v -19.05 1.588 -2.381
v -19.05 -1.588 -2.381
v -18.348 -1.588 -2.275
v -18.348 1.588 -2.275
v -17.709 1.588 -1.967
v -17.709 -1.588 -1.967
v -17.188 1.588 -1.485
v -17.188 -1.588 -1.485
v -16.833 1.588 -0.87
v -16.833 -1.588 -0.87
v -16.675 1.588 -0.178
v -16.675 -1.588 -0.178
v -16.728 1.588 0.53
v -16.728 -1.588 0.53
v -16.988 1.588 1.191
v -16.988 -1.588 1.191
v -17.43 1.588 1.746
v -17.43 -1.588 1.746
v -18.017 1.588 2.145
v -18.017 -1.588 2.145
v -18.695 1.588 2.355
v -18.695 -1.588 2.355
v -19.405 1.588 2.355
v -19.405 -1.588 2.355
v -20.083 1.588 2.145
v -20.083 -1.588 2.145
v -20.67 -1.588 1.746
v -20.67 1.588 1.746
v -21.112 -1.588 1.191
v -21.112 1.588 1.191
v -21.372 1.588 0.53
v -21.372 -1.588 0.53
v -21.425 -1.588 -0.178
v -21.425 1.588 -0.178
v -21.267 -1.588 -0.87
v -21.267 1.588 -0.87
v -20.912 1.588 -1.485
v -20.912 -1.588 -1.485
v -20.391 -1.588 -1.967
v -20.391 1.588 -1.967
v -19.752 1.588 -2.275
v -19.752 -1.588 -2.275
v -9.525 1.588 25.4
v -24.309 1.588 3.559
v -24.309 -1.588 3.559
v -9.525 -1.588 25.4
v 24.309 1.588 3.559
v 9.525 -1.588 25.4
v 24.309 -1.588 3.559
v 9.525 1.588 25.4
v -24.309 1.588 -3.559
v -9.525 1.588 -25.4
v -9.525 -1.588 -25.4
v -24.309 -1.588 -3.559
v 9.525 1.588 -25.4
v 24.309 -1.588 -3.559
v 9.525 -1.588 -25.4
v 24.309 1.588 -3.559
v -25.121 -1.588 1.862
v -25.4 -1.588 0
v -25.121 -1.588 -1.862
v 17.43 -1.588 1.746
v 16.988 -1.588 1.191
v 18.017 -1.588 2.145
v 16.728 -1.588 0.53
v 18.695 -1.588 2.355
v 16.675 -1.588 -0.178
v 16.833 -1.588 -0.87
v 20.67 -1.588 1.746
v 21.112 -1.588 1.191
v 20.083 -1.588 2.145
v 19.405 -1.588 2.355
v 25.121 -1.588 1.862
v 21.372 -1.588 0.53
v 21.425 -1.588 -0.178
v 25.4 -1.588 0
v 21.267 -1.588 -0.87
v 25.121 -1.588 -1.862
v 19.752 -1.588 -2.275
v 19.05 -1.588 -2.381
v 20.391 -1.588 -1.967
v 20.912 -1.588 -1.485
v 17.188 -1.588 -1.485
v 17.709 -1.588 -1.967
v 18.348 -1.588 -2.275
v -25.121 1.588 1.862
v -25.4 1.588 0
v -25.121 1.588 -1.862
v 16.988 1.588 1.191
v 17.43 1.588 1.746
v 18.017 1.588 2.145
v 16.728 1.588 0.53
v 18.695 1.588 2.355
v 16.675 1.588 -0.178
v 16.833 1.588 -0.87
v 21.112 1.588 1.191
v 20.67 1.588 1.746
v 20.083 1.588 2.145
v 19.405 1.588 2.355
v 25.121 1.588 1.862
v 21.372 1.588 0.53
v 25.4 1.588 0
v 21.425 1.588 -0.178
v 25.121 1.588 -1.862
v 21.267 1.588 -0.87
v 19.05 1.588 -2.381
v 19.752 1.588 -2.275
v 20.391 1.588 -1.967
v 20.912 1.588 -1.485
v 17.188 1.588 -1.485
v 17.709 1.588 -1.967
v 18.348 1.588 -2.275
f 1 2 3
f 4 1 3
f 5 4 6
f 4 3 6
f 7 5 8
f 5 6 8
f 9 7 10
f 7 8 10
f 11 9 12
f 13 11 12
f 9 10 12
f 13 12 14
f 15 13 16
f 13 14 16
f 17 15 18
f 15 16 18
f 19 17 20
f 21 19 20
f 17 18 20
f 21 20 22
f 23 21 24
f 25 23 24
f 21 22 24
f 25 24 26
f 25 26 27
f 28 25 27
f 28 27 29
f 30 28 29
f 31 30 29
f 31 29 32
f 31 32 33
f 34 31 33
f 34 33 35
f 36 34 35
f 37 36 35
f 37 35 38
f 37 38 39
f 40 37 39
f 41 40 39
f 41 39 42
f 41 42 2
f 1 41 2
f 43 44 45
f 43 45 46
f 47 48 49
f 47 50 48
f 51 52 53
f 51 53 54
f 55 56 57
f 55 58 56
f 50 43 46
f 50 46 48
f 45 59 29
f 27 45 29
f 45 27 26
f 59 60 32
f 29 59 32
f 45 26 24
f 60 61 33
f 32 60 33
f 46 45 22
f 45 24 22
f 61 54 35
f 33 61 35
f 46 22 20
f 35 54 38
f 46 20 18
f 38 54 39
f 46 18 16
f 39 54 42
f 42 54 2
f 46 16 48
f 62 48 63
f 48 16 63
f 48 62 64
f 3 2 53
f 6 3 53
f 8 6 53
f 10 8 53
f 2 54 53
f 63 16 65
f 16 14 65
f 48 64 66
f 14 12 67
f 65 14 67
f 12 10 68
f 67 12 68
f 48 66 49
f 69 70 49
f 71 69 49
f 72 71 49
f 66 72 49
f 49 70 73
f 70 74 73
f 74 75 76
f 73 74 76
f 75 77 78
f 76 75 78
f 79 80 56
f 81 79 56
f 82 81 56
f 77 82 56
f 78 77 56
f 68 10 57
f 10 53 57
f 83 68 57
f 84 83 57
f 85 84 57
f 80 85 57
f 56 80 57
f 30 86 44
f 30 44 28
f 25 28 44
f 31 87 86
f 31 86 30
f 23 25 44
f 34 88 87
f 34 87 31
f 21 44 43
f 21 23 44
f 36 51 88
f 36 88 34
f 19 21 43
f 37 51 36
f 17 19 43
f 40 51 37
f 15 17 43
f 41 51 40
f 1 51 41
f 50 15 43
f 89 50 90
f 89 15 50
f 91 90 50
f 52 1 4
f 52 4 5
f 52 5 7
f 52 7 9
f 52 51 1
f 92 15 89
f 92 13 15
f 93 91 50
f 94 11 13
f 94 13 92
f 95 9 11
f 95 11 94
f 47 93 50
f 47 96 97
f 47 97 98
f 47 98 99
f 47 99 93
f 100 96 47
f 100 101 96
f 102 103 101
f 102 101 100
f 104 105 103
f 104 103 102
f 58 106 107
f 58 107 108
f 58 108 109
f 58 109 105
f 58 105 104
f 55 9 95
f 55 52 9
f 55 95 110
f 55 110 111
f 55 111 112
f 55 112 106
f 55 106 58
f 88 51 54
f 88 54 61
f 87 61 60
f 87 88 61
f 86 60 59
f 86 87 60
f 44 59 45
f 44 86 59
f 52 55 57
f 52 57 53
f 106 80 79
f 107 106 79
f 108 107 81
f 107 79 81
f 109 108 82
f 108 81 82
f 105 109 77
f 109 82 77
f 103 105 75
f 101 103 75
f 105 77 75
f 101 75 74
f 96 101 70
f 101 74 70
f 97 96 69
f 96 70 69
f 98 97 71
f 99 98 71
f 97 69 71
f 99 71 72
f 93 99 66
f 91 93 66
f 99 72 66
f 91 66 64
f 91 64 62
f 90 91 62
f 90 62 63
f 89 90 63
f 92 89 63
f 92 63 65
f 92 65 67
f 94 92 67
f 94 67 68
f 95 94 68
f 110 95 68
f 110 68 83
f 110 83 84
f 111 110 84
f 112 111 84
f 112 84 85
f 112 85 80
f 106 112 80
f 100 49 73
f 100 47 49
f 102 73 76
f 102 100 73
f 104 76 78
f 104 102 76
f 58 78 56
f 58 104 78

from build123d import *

# Parameters (mm, degrees)
BOSS_EXTRUDE1_DEPTH            = 1.5875
F_3_16_0_1875_DIAMETER_HOLE1_D = 4.7625


with BuildPart() as part:
    # Sketch1 → Boss-Extrude1 (new, symmetric)
    with BuildSketch(Plane(origin=(0, 0, 0), x_dir=(1, 0, 0), z_dir=(0, 1, 0))):
        with BuildLine():
            Line((24.308582085, 3.559468282), (9.525, 25.4))
            Line((9.525, 25.4), (-9.525, 25.4))
            Line((-9.525, 25.4), (-24.308582085, 3.559468282))
            ThreePointArc((-24.308582085, 3.559468282), (-25.4, 0), (-24.308582085, -3.559468282))
            Line((-24.308582085, -3.559468282), (-9.525, -25.4))
            Line((-9.525, -25.4), (9.525, -25.4))
            Line((9.525, -25.4), (24.308582085, -3.559468282))
            ThreePointArc((24.308582085, -3.559468282), (25.4, 0), (24.308582085, 3.559468282))
        make_face()
    extrude(amount=BOSS_EXTRUDE1_DEPTH, both=True)

    # 3/16 (0.1875) Diameter Hole1 (through all)
    with Locations(Plane(origin=(19.05, 1.5875, 0), x_dir=(0, 0, 1), z_dir=(0, 1, 0))):
        with Locations((0, 0), (0, -38.1)):
            Hole(F_3_16_0_1875_DIAMETER_HOLE1_D / 2)


solid = part.part
